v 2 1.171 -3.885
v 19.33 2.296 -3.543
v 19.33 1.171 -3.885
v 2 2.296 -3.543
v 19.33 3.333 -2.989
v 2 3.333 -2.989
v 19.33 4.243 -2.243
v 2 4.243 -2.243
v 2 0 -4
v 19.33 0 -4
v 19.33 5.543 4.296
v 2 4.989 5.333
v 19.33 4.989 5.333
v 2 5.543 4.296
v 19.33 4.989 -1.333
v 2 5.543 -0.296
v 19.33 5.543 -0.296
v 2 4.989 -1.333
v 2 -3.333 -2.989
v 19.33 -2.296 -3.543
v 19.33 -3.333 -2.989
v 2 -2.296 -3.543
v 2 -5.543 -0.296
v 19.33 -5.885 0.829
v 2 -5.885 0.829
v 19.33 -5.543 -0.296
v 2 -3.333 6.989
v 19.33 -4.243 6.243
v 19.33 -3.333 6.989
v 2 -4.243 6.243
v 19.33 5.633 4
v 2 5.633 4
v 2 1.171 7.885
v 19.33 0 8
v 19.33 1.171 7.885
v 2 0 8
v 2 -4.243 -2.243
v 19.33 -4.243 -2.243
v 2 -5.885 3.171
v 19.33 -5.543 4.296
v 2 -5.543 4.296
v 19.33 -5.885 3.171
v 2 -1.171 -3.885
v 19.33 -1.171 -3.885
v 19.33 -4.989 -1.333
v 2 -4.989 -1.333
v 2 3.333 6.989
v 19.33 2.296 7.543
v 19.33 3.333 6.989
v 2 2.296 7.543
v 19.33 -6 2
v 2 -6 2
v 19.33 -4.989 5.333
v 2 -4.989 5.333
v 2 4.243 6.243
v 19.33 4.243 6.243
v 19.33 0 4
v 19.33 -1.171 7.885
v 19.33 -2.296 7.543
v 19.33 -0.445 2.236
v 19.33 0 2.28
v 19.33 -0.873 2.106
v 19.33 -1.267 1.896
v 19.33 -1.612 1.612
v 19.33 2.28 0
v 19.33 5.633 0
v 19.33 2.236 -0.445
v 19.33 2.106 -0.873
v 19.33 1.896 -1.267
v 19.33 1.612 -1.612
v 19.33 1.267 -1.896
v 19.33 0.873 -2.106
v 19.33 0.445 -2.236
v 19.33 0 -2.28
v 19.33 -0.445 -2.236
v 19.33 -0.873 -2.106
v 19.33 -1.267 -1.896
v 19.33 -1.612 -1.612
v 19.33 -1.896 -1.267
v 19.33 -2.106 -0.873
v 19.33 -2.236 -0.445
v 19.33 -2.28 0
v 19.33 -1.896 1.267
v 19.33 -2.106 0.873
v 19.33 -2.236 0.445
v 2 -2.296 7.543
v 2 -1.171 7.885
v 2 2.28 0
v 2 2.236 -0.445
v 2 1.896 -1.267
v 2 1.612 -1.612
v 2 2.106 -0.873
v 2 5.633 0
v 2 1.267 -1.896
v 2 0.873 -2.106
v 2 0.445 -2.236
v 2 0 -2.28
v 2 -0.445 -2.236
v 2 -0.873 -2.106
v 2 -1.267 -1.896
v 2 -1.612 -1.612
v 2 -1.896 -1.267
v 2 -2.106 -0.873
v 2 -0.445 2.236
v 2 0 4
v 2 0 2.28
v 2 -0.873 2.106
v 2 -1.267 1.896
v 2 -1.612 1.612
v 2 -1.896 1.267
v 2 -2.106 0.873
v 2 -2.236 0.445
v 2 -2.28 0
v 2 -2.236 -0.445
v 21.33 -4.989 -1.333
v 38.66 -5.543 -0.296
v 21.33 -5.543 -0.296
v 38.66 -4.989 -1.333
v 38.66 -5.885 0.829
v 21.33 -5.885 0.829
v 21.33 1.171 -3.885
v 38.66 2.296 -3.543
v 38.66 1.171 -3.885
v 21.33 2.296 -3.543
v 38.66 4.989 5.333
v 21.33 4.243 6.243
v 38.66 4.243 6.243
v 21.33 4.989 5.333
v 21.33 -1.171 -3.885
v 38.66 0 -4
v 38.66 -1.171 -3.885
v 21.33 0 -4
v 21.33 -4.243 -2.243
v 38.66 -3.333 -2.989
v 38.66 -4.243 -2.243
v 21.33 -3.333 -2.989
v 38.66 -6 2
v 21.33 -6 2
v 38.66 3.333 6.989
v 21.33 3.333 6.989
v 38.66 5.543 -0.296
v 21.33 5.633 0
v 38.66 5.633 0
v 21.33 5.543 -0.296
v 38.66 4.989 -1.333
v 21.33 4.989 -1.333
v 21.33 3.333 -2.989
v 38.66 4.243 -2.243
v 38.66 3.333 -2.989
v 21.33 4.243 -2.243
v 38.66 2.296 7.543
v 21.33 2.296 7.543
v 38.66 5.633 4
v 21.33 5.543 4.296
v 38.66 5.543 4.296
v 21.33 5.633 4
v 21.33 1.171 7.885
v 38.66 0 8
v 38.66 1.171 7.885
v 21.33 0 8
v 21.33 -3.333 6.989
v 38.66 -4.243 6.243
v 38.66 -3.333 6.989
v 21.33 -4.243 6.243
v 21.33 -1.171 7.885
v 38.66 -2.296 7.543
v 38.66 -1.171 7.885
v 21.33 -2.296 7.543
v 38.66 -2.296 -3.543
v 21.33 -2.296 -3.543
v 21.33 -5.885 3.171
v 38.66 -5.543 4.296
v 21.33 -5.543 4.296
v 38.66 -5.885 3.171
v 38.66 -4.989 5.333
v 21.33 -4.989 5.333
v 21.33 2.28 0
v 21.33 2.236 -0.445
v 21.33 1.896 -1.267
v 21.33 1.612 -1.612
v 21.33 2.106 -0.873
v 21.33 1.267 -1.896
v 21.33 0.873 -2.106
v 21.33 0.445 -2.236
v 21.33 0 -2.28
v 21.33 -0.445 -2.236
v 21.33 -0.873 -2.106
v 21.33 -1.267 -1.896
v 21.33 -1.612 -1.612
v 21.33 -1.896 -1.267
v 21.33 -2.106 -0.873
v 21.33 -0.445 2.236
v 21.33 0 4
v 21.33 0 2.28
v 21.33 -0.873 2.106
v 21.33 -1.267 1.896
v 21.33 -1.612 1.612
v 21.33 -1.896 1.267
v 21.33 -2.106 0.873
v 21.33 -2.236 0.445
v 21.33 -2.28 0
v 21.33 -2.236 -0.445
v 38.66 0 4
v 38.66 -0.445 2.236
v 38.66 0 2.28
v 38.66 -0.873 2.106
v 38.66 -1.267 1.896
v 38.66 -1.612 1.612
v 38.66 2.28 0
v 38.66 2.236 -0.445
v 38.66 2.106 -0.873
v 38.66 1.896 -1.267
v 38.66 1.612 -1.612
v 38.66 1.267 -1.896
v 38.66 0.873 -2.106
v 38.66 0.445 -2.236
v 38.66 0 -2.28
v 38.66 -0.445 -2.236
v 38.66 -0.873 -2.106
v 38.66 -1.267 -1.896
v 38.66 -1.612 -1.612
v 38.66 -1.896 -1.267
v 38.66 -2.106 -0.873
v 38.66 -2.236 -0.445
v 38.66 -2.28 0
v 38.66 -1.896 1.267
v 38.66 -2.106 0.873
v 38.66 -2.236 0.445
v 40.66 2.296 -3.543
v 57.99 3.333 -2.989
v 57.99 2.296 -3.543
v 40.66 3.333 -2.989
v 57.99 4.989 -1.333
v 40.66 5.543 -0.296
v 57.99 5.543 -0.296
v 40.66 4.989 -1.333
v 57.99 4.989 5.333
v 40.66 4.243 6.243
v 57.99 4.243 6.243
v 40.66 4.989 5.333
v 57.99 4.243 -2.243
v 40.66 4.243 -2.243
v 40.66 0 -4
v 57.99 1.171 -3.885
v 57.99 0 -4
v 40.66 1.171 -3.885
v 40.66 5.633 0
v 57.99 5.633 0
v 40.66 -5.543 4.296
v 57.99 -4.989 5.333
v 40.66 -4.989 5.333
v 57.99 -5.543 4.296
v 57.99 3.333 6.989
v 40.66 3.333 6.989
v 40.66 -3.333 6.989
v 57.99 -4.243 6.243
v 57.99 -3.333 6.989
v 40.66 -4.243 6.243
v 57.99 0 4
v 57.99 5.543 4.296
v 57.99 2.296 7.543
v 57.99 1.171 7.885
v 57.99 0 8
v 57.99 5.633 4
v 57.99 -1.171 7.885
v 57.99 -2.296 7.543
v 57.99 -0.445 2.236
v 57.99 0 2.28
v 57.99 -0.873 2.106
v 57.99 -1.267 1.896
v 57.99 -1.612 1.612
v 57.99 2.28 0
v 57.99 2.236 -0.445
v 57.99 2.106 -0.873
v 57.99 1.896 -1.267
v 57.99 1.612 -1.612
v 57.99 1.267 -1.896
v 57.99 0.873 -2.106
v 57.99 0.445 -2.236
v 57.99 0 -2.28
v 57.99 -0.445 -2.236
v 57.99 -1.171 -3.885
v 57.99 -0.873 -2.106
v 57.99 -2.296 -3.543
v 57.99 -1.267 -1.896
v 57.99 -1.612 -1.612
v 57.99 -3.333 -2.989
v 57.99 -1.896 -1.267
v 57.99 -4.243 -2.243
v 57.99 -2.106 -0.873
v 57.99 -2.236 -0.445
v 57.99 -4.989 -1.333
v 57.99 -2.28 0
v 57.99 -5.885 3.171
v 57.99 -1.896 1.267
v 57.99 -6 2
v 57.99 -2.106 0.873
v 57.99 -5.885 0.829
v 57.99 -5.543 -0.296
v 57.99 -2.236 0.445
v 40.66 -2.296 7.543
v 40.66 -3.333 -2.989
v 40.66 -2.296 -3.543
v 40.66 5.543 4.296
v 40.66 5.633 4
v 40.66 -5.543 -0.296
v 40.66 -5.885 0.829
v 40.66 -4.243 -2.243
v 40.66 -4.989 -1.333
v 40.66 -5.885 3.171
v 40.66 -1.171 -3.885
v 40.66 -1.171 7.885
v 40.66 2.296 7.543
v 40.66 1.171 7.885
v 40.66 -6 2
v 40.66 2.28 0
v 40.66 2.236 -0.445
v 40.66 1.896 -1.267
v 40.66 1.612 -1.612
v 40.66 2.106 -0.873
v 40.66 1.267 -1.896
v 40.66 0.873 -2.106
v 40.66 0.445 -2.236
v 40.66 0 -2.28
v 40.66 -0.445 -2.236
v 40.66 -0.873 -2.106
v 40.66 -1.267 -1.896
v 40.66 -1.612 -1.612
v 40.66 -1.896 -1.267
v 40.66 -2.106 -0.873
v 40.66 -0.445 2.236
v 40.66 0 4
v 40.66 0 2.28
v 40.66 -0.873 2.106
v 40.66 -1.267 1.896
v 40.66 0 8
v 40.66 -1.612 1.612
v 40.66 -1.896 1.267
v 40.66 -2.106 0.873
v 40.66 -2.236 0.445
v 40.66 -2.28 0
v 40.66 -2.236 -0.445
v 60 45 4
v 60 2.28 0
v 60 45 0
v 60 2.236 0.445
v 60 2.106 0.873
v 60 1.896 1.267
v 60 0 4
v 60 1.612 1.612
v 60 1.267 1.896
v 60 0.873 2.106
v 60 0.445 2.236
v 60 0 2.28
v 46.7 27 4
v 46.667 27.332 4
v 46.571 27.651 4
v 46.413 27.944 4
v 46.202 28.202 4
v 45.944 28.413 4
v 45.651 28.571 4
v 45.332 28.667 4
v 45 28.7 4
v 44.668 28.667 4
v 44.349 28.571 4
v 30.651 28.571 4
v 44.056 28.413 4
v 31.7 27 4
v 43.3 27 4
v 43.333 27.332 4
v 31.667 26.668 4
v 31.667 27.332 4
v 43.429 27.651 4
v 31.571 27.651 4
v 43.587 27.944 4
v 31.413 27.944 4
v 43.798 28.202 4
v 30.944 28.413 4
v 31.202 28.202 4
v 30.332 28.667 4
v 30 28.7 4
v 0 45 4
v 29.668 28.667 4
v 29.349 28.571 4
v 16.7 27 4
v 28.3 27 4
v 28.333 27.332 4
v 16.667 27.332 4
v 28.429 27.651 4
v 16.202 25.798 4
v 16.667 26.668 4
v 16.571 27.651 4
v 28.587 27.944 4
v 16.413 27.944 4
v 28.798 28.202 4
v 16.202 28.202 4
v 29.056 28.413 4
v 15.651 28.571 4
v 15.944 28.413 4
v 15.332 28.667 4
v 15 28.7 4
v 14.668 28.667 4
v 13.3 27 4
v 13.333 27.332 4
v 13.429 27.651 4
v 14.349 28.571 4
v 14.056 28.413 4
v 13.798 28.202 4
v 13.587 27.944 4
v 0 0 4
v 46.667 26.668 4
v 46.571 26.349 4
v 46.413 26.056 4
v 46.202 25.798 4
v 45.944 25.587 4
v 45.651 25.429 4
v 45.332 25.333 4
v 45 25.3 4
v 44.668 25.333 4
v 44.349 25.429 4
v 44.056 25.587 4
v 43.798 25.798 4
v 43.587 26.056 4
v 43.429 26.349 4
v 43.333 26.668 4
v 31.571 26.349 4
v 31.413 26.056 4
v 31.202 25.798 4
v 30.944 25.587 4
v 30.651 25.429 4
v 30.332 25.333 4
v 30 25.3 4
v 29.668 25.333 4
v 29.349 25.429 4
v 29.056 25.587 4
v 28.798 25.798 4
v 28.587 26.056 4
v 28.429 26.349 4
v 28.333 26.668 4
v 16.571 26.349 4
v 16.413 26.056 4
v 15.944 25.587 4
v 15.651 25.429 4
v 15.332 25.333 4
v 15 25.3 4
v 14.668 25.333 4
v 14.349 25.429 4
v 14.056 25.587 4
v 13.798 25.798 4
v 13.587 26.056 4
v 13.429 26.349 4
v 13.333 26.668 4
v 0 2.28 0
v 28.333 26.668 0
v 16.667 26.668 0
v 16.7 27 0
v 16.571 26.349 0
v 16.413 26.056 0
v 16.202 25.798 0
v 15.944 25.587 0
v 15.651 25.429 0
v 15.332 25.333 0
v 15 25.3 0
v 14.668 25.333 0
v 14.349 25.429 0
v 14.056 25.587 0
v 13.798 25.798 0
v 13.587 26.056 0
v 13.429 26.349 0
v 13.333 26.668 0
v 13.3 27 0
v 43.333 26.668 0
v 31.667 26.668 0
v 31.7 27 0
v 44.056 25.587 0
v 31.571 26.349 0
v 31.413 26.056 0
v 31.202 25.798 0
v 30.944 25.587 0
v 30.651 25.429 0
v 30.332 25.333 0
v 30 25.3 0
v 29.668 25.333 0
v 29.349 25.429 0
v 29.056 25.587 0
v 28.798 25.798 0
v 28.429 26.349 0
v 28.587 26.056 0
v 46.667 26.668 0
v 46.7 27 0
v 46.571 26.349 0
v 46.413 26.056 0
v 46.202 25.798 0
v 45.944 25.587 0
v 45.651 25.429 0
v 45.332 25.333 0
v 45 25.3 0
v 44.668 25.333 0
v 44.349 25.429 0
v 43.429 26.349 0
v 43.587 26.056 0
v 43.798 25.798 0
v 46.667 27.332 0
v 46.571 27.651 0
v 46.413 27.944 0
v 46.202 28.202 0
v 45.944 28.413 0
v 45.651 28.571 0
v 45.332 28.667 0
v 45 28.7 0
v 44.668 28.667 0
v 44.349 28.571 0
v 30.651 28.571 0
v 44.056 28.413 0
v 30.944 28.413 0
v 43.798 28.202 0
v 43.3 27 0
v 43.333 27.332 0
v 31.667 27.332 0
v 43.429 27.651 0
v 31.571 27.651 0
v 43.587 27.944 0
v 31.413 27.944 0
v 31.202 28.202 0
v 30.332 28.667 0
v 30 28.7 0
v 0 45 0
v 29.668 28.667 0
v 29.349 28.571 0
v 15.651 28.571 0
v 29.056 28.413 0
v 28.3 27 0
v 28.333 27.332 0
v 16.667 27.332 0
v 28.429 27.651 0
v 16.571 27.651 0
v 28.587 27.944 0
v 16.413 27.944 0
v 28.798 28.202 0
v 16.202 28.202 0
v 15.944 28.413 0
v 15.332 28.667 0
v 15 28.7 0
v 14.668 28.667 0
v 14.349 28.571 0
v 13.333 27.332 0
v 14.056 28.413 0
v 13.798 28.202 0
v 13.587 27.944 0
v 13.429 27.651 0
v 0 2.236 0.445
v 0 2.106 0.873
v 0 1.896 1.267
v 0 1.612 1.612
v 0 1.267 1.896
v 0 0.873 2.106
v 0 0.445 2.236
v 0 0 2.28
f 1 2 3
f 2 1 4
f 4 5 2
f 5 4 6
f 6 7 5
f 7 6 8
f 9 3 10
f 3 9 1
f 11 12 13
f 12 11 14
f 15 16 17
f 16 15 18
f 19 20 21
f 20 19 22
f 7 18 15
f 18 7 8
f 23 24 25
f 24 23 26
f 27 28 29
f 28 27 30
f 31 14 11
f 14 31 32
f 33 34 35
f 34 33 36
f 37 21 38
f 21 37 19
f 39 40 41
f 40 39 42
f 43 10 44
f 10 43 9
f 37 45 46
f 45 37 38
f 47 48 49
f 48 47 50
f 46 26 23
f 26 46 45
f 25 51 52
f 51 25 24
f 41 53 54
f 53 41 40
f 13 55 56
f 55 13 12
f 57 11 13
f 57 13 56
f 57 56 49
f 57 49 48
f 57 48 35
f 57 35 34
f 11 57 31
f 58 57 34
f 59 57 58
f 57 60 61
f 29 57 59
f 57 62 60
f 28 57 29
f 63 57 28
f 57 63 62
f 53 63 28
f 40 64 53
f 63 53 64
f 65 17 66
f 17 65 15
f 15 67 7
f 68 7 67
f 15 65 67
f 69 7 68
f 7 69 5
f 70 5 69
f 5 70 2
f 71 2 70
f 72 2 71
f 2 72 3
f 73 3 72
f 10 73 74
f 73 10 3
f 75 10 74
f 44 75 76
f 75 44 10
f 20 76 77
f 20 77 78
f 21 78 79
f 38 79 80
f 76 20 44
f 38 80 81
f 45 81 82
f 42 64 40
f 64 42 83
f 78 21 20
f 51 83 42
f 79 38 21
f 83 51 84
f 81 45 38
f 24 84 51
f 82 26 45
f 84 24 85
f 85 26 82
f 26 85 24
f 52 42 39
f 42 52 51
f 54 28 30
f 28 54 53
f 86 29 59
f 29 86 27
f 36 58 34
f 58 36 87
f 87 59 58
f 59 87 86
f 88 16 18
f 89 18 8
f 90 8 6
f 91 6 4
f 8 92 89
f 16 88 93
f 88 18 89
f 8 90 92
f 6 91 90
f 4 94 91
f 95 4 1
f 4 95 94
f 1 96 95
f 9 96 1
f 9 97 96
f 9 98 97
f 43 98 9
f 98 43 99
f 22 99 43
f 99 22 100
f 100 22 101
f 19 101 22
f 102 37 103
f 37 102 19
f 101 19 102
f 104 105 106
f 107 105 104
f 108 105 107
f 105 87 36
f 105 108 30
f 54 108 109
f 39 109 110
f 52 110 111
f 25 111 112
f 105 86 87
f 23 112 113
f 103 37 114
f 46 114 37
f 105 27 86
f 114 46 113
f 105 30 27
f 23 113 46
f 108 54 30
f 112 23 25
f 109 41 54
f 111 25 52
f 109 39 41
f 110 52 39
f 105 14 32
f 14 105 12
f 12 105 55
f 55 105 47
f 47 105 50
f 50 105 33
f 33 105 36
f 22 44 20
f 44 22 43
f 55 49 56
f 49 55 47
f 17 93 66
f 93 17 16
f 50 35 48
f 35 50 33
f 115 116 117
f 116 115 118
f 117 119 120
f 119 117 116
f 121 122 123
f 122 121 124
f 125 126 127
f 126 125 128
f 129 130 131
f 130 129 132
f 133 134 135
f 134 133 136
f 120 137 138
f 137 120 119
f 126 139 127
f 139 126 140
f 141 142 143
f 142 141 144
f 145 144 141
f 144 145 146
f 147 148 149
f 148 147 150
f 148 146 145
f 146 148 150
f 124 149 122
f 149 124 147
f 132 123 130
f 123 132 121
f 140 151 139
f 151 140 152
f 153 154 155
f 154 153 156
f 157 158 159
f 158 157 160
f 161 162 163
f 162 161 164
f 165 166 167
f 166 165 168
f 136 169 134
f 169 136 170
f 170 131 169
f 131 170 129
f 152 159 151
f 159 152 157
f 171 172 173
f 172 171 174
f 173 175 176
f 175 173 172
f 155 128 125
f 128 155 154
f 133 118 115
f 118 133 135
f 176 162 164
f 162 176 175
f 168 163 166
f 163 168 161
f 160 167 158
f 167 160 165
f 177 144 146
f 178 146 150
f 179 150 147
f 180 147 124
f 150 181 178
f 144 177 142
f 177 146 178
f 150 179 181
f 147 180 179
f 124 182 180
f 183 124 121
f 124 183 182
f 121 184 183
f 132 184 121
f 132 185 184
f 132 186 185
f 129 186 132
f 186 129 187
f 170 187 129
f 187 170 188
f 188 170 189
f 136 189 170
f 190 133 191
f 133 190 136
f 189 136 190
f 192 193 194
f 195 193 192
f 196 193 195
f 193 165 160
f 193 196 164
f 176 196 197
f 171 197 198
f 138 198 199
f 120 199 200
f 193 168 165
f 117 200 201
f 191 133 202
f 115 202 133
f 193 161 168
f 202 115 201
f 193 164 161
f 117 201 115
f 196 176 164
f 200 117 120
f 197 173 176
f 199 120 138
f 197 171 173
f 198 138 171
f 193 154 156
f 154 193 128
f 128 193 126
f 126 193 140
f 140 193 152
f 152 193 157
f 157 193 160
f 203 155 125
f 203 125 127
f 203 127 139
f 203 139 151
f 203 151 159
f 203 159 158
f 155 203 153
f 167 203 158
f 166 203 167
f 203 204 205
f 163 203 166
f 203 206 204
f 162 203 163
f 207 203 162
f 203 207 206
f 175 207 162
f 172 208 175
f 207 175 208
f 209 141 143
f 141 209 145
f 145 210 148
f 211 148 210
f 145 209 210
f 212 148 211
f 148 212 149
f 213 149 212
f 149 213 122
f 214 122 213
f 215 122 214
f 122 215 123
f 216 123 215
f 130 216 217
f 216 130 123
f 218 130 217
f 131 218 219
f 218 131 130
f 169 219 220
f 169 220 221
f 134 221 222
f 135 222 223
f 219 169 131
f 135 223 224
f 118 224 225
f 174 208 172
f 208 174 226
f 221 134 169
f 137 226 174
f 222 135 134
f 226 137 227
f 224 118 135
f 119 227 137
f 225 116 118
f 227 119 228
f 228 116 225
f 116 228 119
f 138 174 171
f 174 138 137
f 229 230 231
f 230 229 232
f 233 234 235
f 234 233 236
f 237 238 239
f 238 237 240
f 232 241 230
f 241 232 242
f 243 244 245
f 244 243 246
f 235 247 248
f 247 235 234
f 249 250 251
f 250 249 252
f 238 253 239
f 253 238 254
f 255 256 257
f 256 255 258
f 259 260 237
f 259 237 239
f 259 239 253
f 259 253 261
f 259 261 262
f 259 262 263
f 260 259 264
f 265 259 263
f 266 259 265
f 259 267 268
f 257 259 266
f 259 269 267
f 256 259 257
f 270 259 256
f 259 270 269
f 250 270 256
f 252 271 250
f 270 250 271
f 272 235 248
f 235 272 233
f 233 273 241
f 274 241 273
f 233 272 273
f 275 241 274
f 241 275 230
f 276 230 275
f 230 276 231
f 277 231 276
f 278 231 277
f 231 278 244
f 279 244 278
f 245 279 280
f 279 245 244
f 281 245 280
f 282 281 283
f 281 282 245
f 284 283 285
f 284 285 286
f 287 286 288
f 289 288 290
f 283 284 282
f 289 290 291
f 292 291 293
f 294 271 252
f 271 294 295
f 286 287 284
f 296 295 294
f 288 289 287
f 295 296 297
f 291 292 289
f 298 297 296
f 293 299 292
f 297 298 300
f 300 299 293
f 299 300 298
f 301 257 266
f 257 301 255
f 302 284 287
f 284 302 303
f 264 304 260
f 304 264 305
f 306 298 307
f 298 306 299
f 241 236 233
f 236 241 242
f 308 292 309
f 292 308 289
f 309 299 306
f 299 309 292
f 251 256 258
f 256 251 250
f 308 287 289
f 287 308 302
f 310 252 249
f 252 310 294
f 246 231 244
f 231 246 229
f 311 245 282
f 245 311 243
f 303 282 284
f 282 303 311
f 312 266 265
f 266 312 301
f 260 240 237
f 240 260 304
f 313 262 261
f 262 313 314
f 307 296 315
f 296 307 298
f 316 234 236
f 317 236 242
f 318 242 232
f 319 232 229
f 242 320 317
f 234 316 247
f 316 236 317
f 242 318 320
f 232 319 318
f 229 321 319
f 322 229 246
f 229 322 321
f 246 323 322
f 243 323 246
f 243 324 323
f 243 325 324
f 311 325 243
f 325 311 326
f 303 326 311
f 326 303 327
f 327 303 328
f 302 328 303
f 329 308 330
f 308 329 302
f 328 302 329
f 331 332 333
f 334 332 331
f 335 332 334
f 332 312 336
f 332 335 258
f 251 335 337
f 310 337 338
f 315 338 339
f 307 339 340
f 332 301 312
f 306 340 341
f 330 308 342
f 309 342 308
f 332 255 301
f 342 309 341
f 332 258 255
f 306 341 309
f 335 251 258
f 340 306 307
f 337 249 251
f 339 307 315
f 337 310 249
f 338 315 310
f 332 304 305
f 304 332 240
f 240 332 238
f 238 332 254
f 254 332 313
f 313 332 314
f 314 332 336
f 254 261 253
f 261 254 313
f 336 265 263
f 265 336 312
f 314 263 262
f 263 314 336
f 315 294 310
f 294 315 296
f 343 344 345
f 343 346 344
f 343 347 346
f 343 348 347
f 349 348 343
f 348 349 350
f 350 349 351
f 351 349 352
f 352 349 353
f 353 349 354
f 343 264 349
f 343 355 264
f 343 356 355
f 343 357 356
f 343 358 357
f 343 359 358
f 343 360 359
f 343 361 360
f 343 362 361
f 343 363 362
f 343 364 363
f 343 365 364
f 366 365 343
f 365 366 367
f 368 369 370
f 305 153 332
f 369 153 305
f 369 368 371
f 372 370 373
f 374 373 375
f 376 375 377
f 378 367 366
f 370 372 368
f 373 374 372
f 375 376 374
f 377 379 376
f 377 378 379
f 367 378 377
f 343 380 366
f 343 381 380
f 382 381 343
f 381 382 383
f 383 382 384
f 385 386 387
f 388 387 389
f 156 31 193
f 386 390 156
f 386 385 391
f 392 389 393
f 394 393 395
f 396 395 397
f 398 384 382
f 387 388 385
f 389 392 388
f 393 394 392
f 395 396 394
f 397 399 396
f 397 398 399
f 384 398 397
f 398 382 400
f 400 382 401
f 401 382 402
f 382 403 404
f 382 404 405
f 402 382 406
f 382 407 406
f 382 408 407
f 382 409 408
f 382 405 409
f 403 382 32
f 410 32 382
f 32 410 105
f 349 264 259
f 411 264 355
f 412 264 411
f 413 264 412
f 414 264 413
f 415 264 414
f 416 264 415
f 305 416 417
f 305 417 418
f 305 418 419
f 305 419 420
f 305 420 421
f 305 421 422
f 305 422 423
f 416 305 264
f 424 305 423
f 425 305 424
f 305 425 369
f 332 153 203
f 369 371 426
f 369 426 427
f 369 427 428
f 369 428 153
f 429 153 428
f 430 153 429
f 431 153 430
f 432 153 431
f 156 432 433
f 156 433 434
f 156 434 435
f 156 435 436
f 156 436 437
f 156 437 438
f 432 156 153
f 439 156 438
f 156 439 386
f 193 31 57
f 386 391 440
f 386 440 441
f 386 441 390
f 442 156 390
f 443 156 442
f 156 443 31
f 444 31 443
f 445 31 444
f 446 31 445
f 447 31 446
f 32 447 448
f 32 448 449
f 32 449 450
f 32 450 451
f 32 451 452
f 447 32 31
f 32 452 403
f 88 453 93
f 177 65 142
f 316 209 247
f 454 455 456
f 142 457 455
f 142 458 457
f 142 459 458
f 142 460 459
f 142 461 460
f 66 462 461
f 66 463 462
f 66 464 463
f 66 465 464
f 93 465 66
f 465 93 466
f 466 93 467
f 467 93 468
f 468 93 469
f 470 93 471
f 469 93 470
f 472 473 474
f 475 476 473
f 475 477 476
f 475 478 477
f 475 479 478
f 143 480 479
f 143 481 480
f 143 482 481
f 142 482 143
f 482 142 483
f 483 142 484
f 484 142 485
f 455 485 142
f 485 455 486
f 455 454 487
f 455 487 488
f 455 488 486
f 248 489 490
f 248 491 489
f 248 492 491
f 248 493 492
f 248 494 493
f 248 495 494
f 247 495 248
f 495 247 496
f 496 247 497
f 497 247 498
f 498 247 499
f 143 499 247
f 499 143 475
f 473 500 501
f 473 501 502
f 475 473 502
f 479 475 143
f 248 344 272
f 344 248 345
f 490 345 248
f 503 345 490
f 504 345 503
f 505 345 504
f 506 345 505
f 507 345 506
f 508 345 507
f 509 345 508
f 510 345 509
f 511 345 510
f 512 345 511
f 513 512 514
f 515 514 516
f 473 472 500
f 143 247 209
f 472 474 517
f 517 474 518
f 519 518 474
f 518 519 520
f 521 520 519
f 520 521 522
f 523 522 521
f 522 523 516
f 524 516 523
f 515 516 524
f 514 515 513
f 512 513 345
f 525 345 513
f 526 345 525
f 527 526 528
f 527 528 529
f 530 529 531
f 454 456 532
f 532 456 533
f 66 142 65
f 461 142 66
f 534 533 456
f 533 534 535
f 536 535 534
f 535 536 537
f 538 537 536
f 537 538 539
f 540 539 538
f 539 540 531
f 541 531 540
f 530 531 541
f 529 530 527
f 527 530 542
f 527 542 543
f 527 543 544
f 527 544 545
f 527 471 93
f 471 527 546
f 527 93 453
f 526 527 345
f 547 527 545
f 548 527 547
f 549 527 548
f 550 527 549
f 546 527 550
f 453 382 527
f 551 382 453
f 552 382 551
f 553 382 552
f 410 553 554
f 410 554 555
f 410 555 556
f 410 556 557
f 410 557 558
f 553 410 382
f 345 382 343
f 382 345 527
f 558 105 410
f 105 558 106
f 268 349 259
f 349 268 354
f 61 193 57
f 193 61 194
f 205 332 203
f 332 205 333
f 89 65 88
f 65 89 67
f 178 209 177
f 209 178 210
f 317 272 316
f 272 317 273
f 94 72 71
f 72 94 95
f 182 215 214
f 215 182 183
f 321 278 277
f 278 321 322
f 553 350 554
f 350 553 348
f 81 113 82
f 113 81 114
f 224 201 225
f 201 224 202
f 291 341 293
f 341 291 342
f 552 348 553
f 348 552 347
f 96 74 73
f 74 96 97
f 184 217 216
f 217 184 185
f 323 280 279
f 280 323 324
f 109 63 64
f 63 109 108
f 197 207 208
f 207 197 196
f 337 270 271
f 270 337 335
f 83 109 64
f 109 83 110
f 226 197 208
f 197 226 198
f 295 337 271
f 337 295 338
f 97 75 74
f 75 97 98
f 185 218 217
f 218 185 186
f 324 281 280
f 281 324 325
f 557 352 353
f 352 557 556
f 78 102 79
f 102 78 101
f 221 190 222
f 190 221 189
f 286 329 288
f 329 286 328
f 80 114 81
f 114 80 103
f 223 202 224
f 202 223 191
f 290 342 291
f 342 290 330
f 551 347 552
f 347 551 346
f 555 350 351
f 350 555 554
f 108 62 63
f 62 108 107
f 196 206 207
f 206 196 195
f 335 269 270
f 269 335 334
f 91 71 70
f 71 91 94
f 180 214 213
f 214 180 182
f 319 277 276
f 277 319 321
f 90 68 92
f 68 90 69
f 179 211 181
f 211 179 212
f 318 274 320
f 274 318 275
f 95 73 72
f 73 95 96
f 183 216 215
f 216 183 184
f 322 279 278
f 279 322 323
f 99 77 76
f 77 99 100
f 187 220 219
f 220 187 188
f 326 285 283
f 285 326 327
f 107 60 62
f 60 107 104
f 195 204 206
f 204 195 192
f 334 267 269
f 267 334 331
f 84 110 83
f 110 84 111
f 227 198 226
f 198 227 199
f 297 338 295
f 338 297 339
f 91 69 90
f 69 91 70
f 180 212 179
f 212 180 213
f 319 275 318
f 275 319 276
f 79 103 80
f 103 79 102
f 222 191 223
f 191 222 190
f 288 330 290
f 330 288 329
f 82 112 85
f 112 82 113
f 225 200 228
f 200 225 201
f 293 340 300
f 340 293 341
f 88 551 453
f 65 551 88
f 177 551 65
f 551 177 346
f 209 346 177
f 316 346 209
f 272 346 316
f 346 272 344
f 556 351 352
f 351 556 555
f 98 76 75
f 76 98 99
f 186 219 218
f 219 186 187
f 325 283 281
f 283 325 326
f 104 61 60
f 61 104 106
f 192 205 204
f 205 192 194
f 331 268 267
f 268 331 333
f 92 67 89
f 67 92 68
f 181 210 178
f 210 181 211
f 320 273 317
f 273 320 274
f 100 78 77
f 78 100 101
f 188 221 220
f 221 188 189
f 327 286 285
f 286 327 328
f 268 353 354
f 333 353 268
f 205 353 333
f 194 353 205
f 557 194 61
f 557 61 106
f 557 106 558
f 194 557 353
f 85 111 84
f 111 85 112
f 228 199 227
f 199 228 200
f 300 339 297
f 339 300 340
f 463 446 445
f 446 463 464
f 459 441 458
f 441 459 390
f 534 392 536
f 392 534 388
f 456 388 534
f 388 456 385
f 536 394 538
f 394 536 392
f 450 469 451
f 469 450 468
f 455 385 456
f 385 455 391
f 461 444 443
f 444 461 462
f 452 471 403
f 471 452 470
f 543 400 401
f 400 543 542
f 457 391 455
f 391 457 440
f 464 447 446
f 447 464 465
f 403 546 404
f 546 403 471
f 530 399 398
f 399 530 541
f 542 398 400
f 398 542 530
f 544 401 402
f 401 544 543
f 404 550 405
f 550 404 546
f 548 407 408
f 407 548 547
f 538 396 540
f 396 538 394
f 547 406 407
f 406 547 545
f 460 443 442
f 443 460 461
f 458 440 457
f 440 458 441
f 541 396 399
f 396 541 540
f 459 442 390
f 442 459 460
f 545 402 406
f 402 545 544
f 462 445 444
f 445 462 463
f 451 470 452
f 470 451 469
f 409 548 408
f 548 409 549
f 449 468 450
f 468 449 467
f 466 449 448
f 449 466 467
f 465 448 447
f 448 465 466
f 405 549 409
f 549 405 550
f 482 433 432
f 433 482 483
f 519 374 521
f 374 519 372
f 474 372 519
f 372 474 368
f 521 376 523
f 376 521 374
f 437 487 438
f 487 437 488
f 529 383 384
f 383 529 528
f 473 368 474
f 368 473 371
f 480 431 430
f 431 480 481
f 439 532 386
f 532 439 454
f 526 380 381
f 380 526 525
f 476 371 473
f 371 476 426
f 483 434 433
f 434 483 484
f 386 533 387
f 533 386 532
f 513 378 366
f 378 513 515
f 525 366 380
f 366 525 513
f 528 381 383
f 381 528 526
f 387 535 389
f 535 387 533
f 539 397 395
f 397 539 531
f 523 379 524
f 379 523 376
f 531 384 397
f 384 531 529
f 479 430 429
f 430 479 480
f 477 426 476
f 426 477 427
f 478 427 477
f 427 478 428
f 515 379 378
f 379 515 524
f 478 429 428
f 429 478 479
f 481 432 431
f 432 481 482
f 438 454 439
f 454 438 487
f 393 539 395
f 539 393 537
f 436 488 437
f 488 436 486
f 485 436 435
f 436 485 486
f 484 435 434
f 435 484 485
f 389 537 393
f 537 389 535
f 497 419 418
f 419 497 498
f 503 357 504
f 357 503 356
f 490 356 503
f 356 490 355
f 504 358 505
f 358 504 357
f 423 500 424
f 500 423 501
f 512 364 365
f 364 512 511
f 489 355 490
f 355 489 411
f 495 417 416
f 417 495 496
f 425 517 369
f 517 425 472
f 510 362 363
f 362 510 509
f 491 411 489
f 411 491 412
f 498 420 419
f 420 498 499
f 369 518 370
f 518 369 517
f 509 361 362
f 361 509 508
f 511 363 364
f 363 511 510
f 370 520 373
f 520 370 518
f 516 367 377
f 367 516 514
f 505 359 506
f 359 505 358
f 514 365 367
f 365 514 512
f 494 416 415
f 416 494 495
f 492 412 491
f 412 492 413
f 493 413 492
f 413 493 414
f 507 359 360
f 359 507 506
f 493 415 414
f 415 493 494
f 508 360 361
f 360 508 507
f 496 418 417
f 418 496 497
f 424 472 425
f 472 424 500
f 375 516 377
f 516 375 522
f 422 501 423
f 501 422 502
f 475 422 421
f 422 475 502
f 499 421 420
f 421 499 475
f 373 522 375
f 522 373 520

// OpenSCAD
$fn = 32;

// ----------------------------------------------------------------------
// Hinge leaf: 60 x 51 x 12 mm
// ----------------------------------------------------------------------

// --- parameters (mm) ---
leaf_len = 60;            // leaf length, X
leaf_w = 45;              // leaf width, Y
leaf_t = 4;               // leaf thickness
knuckle_d = 12;           // knuckle diameter
knuckle_w = 17.33;        // knuckle width
knuckle_n = 3;            // number of knuckles
pin_d = 4.56;             // pin bore
gap = 2;                  // gap between the knuckles
screw_d = 3.4;            // screw clearance

module leaf() {
  cube([leaf_len, leaf_w, leaf_t]);
}

module knuckles() {
  /* barrels sit on the leaf edge, the pin axis at half the leaf thickness */
  for (i = [0 : knuckle_n - 1])
    translate([gap + i * (knuckle_w + gap), 0, leaf_t * 0.5])
      rotate([0, 90, 0]) cylinder(h = knuckle_w, d = knuckle_d);
}

difference() {
  union() {
    leaf();
    knuckles();
  }
  rotate([0, 90, 0]) translate([0, 0, -1])
    cylinder(h = leaf_len + 2, d = pin_d);
  translate([15, leaf_w * 0.6, -1]) cylinder(h = leaf_t + 2, d = screw_d);
  translate([30, leaf_w * 0.6, -1]) cylinder(h = leaf_t + 2, d = screw_d);
  translate([45, leaf_w * 0.6, -1]) cylinder(h = leaf_t + 2, d = screw_d);
}
